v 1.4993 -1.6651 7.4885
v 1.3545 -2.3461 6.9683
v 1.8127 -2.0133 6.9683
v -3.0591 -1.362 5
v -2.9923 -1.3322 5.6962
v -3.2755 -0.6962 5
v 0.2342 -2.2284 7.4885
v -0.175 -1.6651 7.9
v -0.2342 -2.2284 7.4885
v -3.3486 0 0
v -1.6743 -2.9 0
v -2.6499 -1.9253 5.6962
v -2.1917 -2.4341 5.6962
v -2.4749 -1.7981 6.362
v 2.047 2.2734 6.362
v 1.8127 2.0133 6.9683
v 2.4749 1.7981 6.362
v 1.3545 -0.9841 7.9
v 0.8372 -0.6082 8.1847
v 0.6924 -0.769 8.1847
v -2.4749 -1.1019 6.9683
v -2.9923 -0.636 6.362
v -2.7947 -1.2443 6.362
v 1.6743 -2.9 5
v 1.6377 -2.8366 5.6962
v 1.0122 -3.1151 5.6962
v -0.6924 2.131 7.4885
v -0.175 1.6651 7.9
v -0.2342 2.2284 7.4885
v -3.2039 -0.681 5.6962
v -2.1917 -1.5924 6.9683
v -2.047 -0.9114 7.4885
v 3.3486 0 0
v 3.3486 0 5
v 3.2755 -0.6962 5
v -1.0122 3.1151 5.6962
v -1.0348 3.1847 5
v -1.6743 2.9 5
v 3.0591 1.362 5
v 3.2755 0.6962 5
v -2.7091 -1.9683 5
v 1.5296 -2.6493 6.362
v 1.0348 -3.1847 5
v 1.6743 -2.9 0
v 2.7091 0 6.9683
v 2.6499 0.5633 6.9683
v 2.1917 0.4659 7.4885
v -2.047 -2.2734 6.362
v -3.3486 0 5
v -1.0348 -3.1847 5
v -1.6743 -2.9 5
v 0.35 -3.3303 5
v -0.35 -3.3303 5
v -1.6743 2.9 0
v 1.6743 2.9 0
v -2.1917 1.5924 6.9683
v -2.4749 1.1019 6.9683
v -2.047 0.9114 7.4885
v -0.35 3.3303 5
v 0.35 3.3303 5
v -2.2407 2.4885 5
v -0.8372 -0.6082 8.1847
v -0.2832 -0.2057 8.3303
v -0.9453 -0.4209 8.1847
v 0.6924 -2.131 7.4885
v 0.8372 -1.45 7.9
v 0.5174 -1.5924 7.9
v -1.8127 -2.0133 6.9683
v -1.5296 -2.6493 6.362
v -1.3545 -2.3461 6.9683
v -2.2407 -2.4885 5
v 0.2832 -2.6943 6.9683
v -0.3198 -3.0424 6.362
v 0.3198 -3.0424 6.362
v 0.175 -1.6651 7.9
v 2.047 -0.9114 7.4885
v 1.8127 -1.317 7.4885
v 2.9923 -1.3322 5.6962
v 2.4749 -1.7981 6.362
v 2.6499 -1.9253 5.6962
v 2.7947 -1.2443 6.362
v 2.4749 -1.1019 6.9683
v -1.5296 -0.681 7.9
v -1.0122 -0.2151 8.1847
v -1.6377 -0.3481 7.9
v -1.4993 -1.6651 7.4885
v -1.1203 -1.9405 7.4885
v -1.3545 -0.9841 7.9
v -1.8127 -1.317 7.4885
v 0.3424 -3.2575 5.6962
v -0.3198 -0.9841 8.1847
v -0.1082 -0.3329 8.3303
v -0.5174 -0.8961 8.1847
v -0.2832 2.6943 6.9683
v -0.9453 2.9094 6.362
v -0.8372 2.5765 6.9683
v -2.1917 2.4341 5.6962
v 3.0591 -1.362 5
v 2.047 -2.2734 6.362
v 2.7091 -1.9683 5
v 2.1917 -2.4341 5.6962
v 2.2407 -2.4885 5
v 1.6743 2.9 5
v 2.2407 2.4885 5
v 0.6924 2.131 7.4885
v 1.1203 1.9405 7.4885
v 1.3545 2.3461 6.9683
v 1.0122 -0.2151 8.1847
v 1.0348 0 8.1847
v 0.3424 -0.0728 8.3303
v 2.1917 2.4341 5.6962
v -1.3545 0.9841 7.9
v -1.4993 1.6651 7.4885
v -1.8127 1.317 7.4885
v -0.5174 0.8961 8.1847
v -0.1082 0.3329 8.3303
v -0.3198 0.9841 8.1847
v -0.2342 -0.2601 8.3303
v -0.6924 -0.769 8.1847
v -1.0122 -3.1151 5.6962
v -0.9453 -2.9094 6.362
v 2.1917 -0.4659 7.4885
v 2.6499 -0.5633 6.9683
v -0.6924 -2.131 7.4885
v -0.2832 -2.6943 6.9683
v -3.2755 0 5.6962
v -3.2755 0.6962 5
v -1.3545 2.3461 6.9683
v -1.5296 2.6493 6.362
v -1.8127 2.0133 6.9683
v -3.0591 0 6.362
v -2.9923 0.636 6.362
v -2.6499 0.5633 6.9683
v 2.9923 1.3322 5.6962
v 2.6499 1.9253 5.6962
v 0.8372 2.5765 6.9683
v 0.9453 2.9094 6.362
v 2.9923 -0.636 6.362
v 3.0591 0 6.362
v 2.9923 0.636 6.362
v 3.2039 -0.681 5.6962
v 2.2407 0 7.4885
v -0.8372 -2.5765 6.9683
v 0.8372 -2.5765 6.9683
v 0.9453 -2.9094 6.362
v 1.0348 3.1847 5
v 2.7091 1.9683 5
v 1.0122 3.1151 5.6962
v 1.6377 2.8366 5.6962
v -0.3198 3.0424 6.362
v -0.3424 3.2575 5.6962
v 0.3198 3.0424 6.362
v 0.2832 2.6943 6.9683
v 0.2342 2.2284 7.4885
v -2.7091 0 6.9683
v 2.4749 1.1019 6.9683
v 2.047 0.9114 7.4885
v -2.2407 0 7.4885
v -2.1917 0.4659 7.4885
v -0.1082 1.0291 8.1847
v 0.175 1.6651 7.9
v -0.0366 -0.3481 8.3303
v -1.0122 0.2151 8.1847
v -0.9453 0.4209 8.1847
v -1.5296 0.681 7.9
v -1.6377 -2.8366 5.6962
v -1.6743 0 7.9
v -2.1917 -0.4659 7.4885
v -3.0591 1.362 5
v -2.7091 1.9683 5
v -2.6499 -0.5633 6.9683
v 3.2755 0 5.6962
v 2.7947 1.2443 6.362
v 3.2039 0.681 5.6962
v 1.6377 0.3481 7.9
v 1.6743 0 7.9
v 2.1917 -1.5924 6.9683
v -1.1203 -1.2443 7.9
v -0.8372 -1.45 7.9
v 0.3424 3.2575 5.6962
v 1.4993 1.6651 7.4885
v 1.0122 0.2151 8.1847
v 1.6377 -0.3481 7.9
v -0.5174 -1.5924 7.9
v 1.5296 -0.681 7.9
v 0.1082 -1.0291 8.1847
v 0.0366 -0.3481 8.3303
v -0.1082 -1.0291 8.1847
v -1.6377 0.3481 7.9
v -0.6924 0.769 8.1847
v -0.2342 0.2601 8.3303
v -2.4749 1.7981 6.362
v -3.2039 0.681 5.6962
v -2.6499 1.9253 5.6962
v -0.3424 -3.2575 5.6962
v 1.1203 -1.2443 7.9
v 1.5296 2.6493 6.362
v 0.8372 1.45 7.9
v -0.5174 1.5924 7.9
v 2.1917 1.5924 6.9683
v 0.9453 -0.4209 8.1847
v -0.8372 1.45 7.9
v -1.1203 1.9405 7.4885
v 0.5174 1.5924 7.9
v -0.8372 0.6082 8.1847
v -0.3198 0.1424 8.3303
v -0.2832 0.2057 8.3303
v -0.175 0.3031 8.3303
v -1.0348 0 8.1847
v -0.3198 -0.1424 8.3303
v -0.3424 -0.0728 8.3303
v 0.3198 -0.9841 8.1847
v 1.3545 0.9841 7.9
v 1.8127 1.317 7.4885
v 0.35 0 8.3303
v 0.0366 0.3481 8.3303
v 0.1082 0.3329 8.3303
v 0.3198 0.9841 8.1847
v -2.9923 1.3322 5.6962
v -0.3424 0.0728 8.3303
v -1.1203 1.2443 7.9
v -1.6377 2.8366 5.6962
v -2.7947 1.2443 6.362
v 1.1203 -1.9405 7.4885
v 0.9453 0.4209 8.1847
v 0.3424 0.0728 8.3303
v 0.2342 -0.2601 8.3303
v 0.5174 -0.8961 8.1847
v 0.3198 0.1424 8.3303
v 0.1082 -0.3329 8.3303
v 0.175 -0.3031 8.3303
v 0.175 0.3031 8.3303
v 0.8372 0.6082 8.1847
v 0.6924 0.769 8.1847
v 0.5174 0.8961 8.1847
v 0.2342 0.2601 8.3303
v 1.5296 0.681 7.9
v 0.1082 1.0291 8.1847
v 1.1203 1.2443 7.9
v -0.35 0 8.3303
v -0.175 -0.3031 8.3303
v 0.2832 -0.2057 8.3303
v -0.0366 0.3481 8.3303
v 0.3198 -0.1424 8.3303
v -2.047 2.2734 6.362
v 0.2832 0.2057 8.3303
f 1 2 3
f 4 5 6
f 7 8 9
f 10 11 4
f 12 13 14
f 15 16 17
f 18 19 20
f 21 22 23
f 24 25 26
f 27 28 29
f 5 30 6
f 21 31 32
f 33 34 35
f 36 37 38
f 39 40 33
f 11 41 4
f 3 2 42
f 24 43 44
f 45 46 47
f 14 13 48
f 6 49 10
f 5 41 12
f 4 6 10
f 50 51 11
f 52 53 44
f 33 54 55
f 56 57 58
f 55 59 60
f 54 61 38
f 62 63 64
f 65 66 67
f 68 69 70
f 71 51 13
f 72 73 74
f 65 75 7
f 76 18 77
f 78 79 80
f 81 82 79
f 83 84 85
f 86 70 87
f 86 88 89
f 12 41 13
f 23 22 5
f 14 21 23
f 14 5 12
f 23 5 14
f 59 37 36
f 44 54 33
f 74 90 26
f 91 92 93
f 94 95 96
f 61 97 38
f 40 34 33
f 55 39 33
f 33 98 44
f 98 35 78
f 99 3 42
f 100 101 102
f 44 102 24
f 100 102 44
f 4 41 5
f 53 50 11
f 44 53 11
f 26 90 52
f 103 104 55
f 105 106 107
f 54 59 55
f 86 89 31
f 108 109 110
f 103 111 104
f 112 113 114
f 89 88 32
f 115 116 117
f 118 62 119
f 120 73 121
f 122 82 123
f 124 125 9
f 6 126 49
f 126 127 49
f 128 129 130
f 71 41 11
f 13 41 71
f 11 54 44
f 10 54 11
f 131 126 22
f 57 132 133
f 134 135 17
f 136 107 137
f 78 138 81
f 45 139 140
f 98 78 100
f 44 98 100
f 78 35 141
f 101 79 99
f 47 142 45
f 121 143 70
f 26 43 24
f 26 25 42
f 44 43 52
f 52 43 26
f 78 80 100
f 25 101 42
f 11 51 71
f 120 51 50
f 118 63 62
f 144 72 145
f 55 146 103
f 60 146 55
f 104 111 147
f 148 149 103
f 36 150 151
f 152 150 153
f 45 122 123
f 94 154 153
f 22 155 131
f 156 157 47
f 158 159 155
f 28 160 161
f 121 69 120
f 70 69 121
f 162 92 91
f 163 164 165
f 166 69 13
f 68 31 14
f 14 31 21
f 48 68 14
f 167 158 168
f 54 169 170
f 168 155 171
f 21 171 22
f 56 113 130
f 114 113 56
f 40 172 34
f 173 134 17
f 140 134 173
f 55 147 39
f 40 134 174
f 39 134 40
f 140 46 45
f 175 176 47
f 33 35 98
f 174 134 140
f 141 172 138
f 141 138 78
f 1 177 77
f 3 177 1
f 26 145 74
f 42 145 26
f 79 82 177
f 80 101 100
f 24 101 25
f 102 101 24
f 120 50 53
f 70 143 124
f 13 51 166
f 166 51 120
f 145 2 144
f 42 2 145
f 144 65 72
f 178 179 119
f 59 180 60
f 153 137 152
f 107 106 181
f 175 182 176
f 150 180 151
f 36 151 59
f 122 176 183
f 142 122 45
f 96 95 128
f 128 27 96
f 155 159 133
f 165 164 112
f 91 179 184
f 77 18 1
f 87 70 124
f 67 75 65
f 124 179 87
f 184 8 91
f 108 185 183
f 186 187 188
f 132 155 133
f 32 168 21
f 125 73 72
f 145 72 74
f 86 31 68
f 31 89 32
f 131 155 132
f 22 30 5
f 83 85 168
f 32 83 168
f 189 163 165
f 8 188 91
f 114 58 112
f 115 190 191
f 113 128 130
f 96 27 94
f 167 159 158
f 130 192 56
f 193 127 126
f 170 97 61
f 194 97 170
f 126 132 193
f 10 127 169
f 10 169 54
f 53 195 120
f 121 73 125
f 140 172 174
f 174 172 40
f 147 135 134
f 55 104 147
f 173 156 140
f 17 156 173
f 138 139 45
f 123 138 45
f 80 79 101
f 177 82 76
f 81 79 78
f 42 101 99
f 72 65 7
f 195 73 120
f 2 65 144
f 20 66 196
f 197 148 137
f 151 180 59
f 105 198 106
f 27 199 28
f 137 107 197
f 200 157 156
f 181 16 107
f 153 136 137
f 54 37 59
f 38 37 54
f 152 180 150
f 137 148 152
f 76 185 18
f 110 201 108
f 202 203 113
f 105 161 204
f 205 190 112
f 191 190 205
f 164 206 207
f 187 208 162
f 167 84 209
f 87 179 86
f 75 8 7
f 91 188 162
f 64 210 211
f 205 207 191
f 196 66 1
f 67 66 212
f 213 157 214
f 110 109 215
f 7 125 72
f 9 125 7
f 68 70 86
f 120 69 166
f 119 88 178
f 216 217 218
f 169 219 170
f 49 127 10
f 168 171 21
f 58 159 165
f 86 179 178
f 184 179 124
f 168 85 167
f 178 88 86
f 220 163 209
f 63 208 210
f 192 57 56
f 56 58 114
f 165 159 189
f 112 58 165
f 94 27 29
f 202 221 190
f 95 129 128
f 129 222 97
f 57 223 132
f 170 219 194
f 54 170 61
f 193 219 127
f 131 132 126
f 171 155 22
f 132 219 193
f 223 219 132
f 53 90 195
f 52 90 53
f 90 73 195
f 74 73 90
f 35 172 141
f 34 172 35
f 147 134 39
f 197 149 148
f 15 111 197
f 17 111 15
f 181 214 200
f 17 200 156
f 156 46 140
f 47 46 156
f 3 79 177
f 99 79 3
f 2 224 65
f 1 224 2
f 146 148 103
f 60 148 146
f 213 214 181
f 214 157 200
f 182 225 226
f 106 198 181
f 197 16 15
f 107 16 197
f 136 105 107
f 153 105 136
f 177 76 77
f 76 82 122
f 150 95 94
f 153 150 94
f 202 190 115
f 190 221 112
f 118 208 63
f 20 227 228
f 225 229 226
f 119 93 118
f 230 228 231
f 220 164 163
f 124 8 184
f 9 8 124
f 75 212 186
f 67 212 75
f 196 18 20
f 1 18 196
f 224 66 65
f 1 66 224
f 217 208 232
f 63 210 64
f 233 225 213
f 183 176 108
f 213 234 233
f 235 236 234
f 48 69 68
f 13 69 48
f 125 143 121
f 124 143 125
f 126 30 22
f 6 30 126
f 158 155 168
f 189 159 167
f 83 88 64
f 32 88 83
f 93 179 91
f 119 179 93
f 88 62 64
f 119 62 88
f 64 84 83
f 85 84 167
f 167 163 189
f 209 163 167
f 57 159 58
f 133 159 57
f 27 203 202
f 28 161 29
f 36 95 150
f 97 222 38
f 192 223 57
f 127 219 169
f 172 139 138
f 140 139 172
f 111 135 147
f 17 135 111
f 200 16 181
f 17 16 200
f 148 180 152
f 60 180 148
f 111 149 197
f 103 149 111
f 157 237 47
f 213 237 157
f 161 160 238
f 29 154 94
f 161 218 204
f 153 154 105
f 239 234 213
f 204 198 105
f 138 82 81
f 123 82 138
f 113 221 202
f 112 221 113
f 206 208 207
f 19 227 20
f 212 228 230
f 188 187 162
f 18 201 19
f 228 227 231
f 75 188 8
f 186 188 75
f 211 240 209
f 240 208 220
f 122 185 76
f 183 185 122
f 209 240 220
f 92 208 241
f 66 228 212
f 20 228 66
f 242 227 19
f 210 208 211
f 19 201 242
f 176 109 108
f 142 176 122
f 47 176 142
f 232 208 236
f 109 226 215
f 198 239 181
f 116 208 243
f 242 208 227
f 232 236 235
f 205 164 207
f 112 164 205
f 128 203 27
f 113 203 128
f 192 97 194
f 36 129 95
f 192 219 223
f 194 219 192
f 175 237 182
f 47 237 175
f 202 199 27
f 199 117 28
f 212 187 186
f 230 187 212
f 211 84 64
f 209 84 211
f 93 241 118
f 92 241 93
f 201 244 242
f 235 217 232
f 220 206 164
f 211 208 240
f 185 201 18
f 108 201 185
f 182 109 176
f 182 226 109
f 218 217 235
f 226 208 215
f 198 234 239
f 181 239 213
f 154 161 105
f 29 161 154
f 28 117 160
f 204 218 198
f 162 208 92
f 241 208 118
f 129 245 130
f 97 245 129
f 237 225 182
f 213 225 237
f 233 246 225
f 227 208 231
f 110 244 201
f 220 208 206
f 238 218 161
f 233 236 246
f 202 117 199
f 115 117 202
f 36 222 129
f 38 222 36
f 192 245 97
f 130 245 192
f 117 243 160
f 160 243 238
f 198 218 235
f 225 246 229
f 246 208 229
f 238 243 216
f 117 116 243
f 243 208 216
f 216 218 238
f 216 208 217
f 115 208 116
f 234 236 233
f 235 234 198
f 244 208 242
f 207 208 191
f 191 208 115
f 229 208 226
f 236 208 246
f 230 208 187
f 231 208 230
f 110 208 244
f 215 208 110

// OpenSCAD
$fn=30;

module slit(angle) {
    rotate(a = angle, v = [0,0,1]) { 
        cube (size = [3.464,6,20], center = true);
    };
}

bolt_depth = 5;

module screw_hole(bolt_depth, radius) {
    union() {
        difference () {
            union() {
                cylinder (h=bolt_depth, r1=radius, r2=radius, center=false);
            }
            union () {
              slit(0.0);
              slit(60.0);
              slit(120.0);
            }
        }
        translate([0,0,bolt_depth]) {
            difference() {
                difference() {
                    sphere(r = radius);
                    sphere(r = radius - 0.5);
                }
                rotate(a = 180, v = [1,0,0]){
                    translate([-100, -100, 0]){
                        cube(200);
                    }
                }
            }
        }
    }
}

module hexslit(height, angle) {
    xy = 5.8;
    side = xy * (tan(30));
    translate ([0, 0, height/2]) {
        rotate(a = angle, v = [0,0,1]) { 
            cube (size = [side,xy,height], center = true);
        }
    }
}

module hex_bolt(height, radius) {
    hull() {
        union() {
            hexslit(height, 0);
            hexslit(height, 60);
            hexslit(height, 120);
        }
        union() {
            translate([0,0,height]){
                sphere(r=(5.8 * tan(30)));
            }
        }
    }
}

difference() {
    hex_bolt(5, 5);
}
